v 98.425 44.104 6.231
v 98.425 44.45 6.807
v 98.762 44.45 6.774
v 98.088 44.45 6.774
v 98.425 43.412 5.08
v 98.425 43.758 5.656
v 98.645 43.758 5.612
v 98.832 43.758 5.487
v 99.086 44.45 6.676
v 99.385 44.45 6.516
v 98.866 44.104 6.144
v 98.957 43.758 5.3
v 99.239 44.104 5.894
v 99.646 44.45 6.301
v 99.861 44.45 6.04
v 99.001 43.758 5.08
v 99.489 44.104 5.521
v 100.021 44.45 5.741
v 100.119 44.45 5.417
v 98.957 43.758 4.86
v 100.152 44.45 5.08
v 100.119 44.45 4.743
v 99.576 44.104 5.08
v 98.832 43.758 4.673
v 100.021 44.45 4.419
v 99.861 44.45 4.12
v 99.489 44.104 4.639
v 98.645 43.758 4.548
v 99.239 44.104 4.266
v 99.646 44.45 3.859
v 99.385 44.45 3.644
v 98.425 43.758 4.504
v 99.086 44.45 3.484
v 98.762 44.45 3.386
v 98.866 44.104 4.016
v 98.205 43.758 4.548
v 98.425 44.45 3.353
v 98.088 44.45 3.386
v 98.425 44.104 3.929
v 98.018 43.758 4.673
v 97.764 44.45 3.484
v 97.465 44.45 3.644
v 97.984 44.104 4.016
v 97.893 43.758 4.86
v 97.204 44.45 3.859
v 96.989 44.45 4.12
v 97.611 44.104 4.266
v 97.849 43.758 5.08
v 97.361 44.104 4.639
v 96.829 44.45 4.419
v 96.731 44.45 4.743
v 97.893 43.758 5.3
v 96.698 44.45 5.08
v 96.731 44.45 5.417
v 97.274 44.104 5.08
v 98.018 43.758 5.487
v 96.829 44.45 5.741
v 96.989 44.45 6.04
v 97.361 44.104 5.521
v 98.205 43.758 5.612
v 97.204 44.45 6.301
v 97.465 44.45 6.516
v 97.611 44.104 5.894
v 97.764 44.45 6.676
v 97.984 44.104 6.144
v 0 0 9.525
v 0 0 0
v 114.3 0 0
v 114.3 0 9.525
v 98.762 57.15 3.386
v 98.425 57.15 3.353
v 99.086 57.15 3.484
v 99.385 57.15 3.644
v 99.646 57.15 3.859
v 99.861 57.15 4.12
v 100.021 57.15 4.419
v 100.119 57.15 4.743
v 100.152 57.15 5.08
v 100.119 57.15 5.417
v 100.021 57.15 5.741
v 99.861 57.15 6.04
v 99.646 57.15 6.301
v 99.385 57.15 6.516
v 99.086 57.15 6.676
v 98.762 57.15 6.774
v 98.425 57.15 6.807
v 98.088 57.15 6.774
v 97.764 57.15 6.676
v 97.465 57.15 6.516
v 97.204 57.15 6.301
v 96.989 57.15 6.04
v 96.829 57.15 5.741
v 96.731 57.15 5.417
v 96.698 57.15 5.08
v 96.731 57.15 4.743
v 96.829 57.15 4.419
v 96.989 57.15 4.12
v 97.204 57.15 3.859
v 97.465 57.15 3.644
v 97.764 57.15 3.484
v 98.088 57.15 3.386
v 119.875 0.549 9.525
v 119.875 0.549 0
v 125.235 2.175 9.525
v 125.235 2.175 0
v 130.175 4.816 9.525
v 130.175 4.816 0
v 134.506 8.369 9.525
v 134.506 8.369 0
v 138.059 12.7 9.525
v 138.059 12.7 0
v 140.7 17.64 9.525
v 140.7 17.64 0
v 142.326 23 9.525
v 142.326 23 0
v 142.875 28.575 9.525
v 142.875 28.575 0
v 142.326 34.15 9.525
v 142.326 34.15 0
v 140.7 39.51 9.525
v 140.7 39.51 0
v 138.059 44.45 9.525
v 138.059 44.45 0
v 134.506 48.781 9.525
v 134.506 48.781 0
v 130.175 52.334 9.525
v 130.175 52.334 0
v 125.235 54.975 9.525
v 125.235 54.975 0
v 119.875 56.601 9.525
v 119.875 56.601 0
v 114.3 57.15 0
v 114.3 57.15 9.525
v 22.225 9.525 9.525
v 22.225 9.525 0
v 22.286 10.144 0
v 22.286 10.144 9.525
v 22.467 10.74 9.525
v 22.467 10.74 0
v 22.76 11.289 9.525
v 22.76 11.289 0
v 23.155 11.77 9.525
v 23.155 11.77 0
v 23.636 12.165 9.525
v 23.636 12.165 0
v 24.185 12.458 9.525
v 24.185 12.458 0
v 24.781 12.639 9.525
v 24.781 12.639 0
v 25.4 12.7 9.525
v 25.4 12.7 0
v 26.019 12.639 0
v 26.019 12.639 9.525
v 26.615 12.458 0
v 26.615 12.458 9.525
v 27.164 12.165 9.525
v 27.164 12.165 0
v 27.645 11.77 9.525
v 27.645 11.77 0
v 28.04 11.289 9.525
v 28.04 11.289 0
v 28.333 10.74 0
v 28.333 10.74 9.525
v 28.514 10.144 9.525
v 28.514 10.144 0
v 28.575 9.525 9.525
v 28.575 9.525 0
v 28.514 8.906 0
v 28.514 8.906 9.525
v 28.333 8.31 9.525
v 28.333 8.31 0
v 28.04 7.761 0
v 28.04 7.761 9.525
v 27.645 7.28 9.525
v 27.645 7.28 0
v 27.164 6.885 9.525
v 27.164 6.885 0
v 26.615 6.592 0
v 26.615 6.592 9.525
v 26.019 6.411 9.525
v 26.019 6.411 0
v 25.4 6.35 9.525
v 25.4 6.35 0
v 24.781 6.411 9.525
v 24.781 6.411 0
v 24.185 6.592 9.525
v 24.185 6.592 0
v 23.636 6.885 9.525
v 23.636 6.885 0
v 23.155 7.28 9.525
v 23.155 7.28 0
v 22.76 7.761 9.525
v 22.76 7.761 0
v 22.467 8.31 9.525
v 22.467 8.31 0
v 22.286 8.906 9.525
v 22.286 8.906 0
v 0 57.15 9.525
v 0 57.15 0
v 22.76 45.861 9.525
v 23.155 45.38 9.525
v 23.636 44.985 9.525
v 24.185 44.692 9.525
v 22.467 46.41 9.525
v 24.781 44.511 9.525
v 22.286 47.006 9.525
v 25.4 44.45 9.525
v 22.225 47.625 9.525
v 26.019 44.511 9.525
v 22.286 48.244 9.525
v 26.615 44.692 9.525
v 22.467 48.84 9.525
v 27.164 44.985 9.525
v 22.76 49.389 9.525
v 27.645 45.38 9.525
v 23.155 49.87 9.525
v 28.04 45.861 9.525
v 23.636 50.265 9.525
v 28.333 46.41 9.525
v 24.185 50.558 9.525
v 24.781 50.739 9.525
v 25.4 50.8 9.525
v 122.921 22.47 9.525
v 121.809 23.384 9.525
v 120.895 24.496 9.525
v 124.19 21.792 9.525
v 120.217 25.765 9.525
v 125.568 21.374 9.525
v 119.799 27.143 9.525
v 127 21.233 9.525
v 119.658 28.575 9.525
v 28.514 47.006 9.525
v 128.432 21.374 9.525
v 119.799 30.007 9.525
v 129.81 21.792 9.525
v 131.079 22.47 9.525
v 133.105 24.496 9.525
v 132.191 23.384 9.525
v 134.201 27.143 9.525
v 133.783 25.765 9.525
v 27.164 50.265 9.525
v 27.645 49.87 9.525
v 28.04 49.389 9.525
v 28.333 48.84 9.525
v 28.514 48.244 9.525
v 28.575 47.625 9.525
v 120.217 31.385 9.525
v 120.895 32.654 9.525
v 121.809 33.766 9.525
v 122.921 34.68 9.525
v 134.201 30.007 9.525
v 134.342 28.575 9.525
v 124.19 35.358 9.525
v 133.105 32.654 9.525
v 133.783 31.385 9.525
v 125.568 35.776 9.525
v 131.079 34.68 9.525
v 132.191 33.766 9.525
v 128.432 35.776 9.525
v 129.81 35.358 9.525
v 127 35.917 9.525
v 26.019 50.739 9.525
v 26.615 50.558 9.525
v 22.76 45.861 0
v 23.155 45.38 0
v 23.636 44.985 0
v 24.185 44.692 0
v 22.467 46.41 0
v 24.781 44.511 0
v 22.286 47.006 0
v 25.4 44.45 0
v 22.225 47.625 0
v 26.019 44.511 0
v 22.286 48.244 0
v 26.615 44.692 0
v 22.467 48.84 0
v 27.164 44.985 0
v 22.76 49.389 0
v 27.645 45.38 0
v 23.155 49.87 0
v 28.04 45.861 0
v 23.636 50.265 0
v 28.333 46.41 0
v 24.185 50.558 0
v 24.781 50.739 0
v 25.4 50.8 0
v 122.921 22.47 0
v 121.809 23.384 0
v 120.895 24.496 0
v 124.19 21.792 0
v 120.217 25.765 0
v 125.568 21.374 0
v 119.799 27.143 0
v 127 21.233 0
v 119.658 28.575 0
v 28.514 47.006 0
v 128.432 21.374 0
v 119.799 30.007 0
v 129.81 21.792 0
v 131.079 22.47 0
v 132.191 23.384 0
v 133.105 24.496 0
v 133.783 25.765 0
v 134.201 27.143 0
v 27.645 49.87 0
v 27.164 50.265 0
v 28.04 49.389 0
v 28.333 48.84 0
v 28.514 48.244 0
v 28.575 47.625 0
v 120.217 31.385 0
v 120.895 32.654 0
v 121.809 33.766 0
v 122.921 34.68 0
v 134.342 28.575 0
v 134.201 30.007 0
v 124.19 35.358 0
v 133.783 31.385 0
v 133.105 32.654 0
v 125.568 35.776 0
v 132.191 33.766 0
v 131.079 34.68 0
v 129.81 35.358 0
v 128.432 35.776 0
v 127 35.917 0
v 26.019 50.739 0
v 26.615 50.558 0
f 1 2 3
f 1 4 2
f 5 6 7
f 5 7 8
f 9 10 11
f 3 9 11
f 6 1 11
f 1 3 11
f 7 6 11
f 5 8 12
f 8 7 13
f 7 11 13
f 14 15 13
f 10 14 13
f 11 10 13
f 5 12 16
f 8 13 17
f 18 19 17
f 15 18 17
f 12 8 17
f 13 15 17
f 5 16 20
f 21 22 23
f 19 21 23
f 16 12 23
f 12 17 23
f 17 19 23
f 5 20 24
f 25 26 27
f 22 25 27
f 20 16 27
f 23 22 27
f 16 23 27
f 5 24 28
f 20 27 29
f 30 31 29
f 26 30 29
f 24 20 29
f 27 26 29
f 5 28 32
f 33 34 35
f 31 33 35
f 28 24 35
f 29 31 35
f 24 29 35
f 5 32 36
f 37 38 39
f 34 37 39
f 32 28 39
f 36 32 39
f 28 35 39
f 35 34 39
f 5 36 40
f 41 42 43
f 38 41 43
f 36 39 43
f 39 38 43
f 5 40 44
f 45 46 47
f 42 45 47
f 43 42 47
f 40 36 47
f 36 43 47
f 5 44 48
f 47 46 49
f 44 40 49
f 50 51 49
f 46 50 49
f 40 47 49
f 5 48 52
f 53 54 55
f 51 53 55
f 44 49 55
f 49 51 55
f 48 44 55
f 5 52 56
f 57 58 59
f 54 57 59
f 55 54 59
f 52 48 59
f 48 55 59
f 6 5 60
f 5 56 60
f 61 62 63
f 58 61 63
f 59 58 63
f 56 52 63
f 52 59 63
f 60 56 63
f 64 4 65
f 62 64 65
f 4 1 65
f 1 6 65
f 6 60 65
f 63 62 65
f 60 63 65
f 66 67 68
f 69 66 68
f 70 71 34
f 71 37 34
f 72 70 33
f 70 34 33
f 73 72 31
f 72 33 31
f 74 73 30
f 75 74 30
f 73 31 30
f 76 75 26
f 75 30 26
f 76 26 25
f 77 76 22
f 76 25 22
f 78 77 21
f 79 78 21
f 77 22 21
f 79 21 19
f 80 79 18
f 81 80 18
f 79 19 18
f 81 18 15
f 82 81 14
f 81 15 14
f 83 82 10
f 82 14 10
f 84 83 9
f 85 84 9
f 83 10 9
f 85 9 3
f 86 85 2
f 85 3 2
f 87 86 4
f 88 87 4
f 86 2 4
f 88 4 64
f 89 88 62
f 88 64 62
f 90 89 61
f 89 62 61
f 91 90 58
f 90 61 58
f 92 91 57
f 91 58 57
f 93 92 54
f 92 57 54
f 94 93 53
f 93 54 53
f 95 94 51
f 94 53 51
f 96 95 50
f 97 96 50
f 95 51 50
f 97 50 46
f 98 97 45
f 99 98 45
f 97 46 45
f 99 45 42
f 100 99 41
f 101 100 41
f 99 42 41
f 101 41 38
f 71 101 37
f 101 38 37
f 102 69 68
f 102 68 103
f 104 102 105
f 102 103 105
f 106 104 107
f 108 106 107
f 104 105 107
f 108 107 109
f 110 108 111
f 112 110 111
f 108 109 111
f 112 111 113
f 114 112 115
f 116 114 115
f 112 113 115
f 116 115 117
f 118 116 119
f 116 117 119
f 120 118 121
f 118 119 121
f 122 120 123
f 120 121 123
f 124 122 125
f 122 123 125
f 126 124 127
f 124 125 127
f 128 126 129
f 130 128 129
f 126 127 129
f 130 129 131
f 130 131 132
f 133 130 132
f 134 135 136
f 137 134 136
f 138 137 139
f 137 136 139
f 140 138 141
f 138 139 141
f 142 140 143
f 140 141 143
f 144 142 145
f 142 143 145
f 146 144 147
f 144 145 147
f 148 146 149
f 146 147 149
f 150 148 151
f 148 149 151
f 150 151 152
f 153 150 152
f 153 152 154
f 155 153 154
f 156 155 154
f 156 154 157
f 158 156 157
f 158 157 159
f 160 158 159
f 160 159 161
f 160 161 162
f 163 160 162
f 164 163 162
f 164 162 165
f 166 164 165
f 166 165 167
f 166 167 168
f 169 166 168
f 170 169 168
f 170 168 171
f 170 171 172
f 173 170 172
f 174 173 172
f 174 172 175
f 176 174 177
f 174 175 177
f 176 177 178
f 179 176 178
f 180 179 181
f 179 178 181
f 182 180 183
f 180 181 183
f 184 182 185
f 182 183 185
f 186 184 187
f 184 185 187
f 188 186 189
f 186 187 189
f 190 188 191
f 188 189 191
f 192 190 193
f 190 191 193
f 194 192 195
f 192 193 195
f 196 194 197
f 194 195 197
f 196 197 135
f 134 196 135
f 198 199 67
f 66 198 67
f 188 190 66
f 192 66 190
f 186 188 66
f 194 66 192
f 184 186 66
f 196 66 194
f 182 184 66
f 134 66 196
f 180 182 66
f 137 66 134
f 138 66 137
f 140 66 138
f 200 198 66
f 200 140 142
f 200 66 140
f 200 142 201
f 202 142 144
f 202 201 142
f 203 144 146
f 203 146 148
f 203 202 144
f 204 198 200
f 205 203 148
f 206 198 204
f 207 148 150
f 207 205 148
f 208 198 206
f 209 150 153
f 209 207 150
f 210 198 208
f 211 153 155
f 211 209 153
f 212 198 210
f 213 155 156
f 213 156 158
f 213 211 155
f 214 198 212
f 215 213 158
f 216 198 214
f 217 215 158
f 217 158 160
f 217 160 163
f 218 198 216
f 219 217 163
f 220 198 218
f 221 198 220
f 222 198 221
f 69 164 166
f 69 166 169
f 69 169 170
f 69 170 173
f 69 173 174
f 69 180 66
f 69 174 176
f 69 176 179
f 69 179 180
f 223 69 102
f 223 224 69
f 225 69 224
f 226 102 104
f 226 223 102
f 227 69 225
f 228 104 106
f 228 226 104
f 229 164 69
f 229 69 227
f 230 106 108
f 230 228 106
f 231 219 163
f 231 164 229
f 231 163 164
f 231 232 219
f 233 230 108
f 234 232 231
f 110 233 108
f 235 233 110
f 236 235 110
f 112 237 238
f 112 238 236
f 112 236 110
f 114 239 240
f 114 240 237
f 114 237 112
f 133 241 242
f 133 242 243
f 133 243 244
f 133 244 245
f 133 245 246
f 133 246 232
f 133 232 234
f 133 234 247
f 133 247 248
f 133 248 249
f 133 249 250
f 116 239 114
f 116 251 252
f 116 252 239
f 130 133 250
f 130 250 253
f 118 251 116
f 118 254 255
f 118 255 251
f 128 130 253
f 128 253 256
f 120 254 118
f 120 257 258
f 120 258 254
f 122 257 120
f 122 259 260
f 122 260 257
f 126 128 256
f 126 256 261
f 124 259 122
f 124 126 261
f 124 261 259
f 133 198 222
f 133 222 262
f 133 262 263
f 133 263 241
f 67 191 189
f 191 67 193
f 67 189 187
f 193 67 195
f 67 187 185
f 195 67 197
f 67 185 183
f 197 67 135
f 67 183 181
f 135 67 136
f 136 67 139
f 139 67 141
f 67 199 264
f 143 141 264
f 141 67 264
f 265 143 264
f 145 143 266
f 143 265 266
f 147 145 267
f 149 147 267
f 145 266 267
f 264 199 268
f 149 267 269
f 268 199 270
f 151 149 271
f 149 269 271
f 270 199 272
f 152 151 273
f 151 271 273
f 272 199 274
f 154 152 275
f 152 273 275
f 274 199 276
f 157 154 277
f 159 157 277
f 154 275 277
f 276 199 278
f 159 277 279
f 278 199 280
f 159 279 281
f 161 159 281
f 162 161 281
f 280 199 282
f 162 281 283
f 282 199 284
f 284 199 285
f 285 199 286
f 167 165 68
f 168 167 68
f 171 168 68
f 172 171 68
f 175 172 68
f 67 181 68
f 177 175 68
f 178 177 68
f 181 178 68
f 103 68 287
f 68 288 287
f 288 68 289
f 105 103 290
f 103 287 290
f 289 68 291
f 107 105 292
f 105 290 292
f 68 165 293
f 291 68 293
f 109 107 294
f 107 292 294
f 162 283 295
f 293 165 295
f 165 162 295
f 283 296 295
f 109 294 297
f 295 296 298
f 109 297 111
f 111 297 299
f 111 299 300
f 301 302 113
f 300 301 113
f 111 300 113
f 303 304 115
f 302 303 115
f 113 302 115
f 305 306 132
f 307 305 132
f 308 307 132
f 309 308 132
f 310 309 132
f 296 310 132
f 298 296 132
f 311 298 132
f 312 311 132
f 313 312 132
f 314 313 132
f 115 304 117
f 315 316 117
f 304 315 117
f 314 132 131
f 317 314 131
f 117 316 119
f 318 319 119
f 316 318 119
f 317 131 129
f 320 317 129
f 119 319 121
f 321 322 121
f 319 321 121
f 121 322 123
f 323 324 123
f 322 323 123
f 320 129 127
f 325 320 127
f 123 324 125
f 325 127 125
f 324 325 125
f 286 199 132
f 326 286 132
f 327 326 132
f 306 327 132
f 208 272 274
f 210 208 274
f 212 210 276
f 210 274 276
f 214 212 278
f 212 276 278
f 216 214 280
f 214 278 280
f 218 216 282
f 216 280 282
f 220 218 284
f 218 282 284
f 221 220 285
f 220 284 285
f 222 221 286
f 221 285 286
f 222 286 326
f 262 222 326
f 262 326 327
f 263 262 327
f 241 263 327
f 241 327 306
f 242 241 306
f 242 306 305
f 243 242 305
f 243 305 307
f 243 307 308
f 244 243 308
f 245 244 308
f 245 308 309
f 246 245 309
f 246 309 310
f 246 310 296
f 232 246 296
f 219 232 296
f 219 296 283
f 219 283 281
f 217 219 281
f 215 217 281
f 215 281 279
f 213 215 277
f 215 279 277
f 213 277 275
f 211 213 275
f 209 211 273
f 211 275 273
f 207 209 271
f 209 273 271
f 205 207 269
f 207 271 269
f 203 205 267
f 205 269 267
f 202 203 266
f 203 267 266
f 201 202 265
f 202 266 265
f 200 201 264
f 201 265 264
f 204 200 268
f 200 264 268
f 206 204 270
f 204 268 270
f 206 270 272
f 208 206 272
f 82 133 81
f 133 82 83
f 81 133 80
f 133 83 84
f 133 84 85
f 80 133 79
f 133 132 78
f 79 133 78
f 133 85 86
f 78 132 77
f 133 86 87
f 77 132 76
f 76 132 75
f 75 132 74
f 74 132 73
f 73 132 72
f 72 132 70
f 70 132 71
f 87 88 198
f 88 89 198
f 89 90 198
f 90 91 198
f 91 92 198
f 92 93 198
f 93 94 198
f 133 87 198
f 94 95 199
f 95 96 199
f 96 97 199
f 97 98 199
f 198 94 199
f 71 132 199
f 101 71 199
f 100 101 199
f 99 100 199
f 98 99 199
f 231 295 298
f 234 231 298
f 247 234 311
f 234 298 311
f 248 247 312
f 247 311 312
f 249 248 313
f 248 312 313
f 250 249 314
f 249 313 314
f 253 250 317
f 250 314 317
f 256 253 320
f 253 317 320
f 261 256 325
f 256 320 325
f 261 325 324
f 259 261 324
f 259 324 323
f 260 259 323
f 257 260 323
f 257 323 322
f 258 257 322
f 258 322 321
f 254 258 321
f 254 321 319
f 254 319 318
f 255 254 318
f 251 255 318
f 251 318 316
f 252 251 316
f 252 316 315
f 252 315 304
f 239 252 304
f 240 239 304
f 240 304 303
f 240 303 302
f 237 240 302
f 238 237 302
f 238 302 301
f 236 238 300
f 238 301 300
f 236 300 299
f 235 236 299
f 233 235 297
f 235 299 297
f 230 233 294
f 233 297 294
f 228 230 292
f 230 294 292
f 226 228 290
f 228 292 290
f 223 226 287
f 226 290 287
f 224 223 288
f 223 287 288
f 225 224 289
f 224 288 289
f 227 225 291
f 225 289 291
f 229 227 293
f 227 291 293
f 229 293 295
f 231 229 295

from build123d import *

# Parameters (mm, degrees)
BOSS_EXTRUDE1_DEPTH         = 9.525
F_5_8_18_TAPPED_HOLE1_D     = 14.68374
F_1_4_0_25_DIAMETER_HOLE1_D = 6.35
F_8_32_TAPPED_HOLE1_D       = 3.4544
F_8_32_TAPPED_HOLE1_DEPTH   = 12.7
F_8_32_TAPPED_HOLE1_TIP     = 1.037806461


with BuildPart() as part:
    # Sketch1 → Boss-Extrude1 (new body)
    with BuildSketch(Plane.XY):
        with BuildLine():
            Line((0, 0), (114.3, 0))
            ThreePointArc((114.3, 0), (142.875, 28.575), (114.3, 57.15))
            Line((114.3, 57.15), (0, 57.15))
            Line((0, 57.15), (0, 0))
        make_face()
    extrude(amount=BOSS_EXTRUDE1_DEPTH)

    # 5/8-18 Tapped Hole1 (through all)
    with Locations(Plane.XY.offset(9.525)):
        with Locations((127, 28.575)):
            Hole(F_5_8_18_TAPPED_HOLE1_D / 2)

    # 1/4 (0.25) Diameter Hole1 (through all)
    with Locations(Plane(origin=(25.4, 47.625, 9.525), x_dir=(1, 0, 0), z_dir=(0, 0, 1))):
        with Locations((0, 0), (0, -38.1)):
            Hole(F_1_4_0_25_DIAMETER_HOLE1_D / 2)

    # #8-32 Tapped Hole1
    with Locations(Plane(origin=(98.425, 57.15, 5.08), x_dir=(0, 0, 1), z_dir=(0, 1, 0))):
        with Locations((0, 0)):
            Hole(F_8_32_TAPPED_HOLE1_D / 2, depth=F_8_32_TAPPED_HOLE1_DEPTH)
            with Locations((0, 0, -(F_8_32_TAPPED_HOLE1_DEPTH + F_8_32_TAPPED_HOLE1_TIP / 2))):  # 118° drill point
                Cone(0, F_8_32_TAPPED_HOLE1_D / 2, F_8_32_TAPPED_HOLE1_TIP, mode=Mode.SUBTRACT)


solid = part.part
